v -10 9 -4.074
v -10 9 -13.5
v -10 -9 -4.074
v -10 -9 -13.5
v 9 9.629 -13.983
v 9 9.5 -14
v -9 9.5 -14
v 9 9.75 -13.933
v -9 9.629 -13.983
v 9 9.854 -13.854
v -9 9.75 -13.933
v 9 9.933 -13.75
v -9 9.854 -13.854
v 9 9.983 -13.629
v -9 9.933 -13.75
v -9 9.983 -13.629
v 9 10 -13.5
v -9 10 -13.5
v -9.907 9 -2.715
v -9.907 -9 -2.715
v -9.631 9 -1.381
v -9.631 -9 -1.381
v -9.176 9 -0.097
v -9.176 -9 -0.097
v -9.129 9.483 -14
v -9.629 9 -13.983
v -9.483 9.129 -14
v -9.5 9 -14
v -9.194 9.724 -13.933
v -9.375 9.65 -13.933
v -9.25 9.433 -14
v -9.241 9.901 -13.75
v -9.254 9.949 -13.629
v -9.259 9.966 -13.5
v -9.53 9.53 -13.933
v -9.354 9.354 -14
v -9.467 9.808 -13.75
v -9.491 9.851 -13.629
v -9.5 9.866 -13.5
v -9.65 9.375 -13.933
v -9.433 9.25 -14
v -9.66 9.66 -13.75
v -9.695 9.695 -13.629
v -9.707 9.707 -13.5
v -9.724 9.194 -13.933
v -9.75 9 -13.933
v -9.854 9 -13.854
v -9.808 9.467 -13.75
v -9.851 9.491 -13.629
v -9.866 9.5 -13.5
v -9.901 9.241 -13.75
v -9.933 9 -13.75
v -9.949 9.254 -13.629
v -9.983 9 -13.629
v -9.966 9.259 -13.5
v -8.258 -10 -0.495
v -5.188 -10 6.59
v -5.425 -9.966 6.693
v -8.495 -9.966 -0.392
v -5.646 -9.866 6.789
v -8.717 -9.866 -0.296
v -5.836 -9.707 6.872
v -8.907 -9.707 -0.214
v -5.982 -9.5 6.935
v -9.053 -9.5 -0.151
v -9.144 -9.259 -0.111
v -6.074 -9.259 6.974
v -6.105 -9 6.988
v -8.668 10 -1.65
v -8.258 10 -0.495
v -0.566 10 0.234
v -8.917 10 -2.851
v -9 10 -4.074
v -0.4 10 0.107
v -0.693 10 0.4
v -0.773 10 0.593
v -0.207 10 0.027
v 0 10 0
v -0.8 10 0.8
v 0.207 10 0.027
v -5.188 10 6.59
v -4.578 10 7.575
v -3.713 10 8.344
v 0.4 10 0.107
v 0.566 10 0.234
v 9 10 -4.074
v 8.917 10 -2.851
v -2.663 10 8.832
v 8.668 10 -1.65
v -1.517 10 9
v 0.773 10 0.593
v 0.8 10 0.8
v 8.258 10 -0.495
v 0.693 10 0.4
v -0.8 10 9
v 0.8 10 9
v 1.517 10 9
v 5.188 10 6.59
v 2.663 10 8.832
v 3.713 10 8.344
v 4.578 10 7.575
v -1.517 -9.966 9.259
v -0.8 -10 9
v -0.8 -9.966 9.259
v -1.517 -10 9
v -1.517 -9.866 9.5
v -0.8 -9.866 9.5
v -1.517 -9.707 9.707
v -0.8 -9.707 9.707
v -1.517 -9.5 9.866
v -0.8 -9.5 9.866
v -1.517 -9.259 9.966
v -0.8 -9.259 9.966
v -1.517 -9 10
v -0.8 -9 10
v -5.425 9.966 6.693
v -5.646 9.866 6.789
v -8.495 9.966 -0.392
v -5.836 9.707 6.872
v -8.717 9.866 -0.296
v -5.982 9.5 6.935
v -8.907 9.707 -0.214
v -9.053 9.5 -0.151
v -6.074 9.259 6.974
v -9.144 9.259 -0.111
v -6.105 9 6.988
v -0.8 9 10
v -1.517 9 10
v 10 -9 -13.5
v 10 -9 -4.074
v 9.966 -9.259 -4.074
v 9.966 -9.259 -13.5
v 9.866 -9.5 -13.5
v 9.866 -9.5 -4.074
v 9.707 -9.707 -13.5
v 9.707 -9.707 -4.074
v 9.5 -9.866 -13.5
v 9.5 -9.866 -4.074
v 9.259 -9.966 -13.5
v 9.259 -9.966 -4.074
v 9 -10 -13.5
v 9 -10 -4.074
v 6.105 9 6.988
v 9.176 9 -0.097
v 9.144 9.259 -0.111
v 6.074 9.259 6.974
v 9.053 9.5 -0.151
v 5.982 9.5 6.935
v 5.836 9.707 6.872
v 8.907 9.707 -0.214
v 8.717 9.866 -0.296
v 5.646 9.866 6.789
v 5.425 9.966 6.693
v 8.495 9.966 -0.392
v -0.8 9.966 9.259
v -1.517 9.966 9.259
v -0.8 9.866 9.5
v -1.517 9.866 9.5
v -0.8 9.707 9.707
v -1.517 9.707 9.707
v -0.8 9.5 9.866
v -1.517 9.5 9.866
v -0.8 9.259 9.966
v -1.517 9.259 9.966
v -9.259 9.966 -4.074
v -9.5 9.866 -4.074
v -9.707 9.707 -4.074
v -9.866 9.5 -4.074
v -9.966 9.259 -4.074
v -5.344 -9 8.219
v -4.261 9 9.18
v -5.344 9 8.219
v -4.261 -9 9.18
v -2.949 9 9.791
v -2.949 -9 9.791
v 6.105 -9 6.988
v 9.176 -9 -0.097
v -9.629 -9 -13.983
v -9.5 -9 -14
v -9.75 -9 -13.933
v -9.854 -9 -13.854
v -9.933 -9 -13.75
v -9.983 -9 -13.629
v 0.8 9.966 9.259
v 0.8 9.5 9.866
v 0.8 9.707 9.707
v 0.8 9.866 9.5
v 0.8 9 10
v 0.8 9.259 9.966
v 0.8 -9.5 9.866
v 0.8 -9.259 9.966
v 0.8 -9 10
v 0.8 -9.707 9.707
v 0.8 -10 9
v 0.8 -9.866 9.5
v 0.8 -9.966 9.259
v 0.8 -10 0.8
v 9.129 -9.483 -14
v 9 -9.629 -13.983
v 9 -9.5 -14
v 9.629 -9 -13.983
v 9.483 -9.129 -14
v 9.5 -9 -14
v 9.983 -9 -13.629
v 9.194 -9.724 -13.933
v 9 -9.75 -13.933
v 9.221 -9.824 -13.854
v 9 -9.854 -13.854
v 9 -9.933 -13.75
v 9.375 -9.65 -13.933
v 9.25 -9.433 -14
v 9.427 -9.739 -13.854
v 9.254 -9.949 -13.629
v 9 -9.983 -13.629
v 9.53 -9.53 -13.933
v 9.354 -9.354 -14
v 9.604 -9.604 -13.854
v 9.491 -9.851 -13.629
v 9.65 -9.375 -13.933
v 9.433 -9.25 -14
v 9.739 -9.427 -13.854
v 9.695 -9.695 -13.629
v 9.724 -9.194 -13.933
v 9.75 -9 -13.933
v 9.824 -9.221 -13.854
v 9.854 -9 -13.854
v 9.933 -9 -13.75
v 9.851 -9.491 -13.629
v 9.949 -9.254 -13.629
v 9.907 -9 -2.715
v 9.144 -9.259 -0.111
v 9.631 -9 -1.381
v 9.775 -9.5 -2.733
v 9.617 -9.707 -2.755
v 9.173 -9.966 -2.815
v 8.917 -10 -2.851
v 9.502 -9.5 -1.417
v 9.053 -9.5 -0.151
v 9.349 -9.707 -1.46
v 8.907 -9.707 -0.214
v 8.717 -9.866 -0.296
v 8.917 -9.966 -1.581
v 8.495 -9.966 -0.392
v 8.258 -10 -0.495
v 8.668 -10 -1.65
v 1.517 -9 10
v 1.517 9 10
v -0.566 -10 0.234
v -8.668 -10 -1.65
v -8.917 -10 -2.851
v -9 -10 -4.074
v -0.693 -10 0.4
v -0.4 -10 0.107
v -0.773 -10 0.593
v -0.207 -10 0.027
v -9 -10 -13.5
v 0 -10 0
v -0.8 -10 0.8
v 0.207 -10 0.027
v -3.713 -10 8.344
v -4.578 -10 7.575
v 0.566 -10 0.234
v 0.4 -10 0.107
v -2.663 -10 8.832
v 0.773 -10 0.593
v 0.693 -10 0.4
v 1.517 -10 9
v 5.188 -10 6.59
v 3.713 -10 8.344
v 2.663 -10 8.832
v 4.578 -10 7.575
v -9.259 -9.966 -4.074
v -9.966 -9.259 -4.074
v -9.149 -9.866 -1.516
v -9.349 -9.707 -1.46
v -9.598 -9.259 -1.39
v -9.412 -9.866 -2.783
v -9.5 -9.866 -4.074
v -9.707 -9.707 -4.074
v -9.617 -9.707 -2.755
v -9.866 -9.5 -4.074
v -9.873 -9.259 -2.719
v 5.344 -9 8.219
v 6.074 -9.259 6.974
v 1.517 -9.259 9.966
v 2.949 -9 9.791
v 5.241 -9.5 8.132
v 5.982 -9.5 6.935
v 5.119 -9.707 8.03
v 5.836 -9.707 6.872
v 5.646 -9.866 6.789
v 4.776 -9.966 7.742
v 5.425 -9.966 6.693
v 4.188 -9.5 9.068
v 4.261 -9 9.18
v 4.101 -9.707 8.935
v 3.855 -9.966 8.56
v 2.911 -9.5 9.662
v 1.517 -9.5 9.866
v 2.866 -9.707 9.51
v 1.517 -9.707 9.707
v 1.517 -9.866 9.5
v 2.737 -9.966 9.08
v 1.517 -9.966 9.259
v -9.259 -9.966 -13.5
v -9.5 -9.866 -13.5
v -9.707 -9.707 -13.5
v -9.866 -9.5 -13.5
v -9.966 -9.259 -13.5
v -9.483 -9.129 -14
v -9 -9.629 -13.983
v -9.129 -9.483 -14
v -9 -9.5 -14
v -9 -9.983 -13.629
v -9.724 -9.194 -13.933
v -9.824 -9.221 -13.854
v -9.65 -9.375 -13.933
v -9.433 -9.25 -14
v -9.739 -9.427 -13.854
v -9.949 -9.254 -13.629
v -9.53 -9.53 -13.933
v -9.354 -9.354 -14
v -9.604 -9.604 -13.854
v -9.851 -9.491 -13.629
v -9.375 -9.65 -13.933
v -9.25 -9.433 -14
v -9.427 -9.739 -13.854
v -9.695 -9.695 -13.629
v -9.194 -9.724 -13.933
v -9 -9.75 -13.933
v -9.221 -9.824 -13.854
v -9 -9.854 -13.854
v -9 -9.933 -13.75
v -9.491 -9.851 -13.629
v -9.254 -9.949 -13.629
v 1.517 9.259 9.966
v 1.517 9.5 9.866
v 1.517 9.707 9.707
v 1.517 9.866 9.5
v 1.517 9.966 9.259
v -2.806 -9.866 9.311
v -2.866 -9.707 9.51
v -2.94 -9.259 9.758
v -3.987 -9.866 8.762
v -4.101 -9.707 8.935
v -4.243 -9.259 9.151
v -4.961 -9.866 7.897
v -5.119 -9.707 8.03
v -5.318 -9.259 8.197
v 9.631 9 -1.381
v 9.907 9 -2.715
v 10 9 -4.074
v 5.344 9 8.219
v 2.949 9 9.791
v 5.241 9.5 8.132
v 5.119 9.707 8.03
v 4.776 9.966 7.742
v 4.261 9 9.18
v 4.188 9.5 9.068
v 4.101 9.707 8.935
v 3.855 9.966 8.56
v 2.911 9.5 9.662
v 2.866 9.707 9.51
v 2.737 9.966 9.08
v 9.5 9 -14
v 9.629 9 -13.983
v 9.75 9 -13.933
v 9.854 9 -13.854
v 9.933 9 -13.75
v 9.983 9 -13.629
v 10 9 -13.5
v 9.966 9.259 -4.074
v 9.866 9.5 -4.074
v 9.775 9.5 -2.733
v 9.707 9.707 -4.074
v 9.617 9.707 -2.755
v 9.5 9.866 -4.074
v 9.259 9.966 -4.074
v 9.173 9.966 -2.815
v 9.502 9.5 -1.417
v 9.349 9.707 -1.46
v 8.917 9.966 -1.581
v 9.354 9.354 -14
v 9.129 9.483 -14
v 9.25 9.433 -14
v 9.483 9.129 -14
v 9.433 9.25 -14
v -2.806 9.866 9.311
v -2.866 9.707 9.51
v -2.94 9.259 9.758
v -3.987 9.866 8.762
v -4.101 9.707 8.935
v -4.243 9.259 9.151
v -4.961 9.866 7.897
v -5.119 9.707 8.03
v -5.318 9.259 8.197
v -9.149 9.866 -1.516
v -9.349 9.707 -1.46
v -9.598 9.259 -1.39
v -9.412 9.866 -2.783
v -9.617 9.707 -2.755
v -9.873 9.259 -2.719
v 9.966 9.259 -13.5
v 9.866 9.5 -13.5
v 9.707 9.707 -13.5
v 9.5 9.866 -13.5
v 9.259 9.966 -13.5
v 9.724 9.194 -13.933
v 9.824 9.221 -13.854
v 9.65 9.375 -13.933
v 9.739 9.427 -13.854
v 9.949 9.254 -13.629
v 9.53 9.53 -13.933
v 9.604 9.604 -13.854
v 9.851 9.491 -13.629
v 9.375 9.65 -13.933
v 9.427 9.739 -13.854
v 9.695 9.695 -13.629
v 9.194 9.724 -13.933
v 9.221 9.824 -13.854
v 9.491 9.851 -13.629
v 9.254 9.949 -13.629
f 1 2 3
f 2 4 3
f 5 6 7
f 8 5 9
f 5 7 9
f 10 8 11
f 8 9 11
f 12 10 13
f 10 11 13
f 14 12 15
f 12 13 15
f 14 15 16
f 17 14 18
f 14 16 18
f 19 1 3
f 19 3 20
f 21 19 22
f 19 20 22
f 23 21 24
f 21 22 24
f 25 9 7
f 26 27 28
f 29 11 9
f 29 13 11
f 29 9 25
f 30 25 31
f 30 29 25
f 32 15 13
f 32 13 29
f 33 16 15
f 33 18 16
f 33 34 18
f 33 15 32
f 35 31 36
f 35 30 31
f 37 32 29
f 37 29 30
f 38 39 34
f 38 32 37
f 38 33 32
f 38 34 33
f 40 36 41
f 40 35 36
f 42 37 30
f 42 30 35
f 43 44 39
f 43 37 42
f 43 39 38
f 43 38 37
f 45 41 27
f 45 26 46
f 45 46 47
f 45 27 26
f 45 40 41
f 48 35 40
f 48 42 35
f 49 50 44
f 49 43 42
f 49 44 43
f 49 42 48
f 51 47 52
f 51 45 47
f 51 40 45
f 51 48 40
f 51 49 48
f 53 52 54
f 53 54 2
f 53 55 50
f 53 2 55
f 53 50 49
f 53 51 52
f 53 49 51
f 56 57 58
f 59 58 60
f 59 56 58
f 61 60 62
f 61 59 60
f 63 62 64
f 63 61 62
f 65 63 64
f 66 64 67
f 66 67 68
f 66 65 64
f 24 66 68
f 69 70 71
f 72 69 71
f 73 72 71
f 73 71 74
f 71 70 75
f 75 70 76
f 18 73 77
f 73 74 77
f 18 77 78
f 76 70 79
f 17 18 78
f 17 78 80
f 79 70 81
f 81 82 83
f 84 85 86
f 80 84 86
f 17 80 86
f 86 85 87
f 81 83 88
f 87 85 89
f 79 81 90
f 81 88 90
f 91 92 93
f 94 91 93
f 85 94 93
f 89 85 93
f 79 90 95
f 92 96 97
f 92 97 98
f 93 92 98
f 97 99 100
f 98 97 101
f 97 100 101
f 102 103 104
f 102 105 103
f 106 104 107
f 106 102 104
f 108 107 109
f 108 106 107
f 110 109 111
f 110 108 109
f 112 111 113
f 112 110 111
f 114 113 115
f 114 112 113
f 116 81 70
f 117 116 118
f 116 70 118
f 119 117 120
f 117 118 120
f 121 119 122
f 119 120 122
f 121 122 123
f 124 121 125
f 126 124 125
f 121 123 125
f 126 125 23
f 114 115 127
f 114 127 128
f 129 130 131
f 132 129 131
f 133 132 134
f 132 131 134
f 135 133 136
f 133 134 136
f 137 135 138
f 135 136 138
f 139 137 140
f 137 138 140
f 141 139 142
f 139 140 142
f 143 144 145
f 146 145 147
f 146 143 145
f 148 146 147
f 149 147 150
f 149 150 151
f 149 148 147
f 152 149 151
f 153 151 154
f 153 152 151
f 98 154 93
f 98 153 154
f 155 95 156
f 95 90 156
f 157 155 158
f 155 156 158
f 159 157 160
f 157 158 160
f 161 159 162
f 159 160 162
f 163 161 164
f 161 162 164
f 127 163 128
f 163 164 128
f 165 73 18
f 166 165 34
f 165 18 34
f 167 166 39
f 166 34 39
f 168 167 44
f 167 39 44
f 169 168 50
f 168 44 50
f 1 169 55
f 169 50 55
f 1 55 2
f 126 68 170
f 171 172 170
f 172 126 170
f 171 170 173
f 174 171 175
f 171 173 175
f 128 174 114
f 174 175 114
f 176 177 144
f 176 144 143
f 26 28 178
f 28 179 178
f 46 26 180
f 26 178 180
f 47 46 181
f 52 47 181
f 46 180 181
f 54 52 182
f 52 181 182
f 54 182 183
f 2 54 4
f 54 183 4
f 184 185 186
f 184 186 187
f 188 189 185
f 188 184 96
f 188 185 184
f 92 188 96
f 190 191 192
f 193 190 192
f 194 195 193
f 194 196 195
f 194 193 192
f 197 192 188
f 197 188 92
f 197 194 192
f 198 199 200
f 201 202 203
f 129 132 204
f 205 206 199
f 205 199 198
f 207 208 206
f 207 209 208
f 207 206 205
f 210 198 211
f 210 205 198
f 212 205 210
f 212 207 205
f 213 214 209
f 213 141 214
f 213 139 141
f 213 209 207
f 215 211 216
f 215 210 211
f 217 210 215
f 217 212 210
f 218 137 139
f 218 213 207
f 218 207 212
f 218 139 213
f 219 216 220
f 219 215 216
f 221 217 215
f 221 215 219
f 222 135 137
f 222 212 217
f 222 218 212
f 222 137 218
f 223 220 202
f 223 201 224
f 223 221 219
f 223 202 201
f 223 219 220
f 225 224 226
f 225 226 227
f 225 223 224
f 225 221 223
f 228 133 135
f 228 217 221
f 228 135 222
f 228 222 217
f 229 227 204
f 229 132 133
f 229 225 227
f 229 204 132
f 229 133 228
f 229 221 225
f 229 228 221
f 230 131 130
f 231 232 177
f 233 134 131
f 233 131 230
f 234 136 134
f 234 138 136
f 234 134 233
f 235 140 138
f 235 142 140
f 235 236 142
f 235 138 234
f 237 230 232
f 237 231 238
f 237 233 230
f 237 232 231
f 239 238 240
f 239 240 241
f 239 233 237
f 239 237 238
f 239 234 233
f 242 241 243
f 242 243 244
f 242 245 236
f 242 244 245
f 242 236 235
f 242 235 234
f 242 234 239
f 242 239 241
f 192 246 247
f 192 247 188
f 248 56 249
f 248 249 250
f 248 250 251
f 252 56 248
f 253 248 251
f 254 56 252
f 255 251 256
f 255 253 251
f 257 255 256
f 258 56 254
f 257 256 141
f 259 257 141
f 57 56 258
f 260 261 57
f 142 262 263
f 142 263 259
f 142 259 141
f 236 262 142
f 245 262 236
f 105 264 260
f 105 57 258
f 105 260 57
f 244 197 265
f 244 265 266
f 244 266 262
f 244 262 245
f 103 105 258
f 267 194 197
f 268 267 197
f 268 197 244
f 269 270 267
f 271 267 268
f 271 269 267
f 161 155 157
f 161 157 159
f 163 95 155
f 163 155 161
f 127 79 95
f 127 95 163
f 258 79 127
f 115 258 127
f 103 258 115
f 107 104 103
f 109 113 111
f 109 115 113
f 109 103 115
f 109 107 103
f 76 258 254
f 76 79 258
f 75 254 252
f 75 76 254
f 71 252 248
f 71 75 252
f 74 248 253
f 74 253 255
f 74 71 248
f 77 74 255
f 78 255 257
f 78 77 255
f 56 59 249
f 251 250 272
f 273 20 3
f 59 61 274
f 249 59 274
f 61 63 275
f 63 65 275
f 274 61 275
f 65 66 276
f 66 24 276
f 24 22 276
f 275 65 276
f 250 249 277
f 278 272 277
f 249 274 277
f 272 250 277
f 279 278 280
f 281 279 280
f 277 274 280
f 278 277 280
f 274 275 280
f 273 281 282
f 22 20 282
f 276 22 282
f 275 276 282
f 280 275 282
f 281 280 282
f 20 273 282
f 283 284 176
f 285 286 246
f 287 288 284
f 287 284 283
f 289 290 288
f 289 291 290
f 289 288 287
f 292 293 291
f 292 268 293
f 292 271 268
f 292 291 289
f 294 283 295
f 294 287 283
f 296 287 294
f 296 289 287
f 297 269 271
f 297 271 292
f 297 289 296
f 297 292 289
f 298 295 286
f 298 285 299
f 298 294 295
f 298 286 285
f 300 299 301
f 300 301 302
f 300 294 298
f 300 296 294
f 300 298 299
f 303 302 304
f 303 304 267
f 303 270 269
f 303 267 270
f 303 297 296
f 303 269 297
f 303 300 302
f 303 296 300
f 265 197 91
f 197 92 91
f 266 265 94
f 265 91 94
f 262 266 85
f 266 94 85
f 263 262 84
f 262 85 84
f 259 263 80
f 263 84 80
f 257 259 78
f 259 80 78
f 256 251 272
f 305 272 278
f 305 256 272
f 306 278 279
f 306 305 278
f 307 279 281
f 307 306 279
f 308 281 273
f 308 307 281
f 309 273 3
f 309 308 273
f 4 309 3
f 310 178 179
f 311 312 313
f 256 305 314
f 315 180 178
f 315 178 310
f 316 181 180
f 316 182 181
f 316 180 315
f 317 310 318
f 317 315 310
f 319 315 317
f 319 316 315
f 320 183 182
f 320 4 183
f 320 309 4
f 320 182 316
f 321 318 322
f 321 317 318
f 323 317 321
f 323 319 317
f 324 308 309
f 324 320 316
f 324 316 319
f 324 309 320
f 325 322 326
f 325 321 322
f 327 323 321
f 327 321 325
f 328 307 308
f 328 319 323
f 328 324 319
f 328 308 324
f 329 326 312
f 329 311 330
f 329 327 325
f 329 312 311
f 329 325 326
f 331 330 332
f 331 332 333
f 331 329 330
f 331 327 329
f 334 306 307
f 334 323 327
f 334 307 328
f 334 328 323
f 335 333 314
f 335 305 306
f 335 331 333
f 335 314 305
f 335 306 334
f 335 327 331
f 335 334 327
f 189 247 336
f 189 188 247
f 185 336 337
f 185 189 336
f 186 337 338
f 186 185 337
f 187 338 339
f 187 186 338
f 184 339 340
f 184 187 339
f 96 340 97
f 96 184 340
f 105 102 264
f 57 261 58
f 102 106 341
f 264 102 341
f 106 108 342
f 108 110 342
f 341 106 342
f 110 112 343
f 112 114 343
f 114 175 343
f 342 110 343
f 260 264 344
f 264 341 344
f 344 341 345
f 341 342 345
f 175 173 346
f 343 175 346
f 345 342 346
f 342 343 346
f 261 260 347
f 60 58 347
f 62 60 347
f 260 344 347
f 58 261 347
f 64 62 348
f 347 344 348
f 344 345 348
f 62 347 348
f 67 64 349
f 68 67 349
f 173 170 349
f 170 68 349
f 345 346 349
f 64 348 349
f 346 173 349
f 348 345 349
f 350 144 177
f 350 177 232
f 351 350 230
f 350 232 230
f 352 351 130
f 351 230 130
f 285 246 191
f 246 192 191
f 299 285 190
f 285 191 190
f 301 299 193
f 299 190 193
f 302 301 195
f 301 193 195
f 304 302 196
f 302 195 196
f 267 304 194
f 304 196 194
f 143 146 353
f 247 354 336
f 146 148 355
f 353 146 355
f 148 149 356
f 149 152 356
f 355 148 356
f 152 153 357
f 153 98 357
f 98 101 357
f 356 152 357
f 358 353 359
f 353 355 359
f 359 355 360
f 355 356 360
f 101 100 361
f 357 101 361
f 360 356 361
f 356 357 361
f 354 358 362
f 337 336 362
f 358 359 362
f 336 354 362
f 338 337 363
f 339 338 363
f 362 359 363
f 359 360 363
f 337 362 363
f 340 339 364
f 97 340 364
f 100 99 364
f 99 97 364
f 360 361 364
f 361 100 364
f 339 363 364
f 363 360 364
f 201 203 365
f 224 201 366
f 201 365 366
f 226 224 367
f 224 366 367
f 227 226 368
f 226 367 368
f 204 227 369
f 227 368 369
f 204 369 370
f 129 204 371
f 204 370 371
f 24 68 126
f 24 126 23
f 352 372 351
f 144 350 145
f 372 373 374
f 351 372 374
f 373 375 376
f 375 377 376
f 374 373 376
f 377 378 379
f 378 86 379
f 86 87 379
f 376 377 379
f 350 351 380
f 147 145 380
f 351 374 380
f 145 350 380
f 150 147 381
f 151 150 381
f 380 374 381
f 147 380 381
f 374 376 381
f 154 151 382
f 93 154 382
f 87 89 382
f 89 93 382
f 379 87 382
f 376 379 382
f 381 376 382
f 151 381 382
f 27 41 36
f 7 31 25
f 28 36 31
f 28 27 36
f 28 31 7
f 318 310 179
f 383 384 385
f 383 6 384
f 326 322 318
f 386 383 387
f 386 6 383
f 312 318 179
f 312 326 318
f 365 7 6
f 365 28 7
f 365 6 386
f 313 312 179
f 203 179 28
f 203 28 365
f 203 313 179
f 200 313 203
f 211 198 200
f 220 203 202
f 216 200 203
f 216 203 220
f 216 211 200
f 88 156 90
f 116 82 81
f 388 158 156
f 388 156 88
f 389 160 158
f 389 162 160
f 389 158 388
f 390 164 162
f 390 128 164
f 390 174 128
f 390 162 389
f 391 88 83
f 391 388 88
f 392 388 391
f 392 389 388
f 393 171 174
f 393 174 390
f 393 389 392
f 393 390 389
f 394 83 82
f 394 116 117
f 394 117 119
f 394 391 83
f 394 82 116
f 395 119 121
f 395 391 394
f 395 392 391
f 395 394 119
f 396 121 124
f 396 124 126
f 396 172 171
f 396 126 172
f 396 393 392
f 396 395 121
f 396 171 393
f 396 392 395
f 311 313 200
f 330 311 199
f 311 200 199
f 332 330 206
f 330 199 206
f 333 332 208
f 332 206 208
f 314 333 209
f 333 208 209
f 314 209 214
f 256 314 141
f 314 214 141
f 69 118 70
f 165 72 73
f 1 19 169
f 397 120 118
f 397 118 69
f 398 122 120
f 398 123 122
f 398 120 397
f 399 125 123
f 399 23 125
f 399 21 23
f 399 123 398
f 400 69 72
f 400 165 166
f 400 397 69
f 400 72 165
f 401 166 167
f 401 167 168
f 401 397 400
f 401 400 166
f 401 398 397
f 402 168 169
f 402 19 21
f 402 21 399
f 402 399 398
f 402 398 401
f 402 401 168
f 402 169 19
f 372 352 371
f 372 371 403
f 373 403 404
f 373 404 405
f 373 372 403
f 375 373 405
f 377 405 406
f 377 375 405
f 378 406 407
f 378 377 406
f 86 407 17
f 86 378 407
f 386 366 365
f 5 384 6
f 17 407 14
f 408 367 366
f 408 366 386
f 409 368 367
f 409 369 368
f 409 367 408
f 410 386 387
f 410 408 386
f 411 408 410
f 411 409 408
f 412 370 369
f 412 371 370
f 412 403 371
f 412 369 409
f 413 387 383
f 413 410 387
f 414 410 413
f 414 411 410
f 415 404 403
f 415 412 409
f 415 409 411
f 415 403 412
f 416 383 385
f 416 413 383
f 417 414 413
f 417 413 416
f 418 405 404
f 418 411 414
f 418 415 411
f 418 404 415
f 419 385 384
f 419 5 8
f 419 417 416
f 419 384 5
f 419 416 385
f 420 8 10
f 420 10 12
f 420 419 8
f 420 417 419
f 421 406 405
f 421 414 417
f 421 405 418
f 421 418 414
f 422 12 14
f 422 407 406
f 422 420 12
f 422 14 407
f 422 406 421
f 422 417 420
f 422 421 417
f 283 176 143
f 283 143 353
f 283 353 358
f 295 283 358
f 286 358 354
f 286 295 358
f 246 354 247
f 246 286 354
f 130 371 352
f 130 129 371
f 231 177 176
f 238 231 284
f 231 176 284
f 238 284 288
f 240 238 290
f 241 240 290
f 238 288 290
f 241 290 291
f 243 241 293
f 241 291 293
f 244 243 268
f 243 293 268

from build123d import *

# Parameters (mm, degrees)
F0_W     = 10
F0_H     = 12
F1_DEPTH = 10
F2_R     = 10
F3_R     = 5
F4_R     = 1
F5_R     = 0.79999
F6_R     = 0.5


# Not quite as in the source:
# - a fillet or chamfer is up to 0.001 mm smaller than in the source, because OpenCascade refuses the exact size
# - a feature names something its author has since deleted; it is built from what else it names


with BuildPart() as f1:
    # F0 (on Front) → F1 (new body, symmetric)
    with BuildSketch(Plane.XZ):
        Polygon((-0.8, 10), (-4.8, 10), (-10, -2), (0, -2), (0, 0), (-0.8, 0), align=None)
        Polygon((0, 0), (0, -2), (10, -2), (4.8, 10), (0.8, 10), (0.8, 0), align=None)
        with Locations((-5, -8)):
            Rectangle(F0_W, F0_H)
        with Locations((5, -8)):
            Rectangle(F0_W, F0_H)
    extrude(amount=F1_DEPTH, both=True)

    # F2
    f2_edges = [f1.edges().sort_by_distance(p)[0] for p in [
        (10, 0, -2),
        (-10, 0, -2),
    ]]
    fillet(f2_edges, radius=F2_R)

    # F3
    f3_edges = [f1.edges().sort_by_distance(p)[0] for p in [
        (4.8, 0, 10),
        (-4.8, 0, 10),
    ]]
    fillet(f3_edges, radius=F3_R)

    # F4
    f4_edges = [f1.edges().sort_by_distance(p)[0] for p in [
        (7.64037, 10, 3.4453),
        (7.64037, -10, 3.4453),
        (-7.64037, 10, 3.4453),
        (-7.64037, -10, 3.4453),
    ]]
    fillet(f4_edges, radius=F4_R)

    # F5 (radius 0.8 in the source; OpenCascade refuses exactly that, so slightly less here)
    f5_edges = [f1.edges().sort_by_distance(p)[0] for p in [
        (-0.8, 0, 0),
        (0.8, 0, 0),
    ]]
    fillet(f5_edges, radius=F5_R)

    # F6
    f6_edges = [f1.edges().sort_by_distance(p)[0] for p in [
        (-10, 0, -14),
        (-9.707107, 9.707107, -14),
        (-9.707107, -9.707107, -14),
        (0, 10, -14),
        (0, -10, -14),
        (9.707107, 9.707107, -14),
        (9.707107, -9.707107, -14),
        (10, 0, -14),
    ]]
    fillet(f6_edges, radius=F6_R)


solid = f1.part
